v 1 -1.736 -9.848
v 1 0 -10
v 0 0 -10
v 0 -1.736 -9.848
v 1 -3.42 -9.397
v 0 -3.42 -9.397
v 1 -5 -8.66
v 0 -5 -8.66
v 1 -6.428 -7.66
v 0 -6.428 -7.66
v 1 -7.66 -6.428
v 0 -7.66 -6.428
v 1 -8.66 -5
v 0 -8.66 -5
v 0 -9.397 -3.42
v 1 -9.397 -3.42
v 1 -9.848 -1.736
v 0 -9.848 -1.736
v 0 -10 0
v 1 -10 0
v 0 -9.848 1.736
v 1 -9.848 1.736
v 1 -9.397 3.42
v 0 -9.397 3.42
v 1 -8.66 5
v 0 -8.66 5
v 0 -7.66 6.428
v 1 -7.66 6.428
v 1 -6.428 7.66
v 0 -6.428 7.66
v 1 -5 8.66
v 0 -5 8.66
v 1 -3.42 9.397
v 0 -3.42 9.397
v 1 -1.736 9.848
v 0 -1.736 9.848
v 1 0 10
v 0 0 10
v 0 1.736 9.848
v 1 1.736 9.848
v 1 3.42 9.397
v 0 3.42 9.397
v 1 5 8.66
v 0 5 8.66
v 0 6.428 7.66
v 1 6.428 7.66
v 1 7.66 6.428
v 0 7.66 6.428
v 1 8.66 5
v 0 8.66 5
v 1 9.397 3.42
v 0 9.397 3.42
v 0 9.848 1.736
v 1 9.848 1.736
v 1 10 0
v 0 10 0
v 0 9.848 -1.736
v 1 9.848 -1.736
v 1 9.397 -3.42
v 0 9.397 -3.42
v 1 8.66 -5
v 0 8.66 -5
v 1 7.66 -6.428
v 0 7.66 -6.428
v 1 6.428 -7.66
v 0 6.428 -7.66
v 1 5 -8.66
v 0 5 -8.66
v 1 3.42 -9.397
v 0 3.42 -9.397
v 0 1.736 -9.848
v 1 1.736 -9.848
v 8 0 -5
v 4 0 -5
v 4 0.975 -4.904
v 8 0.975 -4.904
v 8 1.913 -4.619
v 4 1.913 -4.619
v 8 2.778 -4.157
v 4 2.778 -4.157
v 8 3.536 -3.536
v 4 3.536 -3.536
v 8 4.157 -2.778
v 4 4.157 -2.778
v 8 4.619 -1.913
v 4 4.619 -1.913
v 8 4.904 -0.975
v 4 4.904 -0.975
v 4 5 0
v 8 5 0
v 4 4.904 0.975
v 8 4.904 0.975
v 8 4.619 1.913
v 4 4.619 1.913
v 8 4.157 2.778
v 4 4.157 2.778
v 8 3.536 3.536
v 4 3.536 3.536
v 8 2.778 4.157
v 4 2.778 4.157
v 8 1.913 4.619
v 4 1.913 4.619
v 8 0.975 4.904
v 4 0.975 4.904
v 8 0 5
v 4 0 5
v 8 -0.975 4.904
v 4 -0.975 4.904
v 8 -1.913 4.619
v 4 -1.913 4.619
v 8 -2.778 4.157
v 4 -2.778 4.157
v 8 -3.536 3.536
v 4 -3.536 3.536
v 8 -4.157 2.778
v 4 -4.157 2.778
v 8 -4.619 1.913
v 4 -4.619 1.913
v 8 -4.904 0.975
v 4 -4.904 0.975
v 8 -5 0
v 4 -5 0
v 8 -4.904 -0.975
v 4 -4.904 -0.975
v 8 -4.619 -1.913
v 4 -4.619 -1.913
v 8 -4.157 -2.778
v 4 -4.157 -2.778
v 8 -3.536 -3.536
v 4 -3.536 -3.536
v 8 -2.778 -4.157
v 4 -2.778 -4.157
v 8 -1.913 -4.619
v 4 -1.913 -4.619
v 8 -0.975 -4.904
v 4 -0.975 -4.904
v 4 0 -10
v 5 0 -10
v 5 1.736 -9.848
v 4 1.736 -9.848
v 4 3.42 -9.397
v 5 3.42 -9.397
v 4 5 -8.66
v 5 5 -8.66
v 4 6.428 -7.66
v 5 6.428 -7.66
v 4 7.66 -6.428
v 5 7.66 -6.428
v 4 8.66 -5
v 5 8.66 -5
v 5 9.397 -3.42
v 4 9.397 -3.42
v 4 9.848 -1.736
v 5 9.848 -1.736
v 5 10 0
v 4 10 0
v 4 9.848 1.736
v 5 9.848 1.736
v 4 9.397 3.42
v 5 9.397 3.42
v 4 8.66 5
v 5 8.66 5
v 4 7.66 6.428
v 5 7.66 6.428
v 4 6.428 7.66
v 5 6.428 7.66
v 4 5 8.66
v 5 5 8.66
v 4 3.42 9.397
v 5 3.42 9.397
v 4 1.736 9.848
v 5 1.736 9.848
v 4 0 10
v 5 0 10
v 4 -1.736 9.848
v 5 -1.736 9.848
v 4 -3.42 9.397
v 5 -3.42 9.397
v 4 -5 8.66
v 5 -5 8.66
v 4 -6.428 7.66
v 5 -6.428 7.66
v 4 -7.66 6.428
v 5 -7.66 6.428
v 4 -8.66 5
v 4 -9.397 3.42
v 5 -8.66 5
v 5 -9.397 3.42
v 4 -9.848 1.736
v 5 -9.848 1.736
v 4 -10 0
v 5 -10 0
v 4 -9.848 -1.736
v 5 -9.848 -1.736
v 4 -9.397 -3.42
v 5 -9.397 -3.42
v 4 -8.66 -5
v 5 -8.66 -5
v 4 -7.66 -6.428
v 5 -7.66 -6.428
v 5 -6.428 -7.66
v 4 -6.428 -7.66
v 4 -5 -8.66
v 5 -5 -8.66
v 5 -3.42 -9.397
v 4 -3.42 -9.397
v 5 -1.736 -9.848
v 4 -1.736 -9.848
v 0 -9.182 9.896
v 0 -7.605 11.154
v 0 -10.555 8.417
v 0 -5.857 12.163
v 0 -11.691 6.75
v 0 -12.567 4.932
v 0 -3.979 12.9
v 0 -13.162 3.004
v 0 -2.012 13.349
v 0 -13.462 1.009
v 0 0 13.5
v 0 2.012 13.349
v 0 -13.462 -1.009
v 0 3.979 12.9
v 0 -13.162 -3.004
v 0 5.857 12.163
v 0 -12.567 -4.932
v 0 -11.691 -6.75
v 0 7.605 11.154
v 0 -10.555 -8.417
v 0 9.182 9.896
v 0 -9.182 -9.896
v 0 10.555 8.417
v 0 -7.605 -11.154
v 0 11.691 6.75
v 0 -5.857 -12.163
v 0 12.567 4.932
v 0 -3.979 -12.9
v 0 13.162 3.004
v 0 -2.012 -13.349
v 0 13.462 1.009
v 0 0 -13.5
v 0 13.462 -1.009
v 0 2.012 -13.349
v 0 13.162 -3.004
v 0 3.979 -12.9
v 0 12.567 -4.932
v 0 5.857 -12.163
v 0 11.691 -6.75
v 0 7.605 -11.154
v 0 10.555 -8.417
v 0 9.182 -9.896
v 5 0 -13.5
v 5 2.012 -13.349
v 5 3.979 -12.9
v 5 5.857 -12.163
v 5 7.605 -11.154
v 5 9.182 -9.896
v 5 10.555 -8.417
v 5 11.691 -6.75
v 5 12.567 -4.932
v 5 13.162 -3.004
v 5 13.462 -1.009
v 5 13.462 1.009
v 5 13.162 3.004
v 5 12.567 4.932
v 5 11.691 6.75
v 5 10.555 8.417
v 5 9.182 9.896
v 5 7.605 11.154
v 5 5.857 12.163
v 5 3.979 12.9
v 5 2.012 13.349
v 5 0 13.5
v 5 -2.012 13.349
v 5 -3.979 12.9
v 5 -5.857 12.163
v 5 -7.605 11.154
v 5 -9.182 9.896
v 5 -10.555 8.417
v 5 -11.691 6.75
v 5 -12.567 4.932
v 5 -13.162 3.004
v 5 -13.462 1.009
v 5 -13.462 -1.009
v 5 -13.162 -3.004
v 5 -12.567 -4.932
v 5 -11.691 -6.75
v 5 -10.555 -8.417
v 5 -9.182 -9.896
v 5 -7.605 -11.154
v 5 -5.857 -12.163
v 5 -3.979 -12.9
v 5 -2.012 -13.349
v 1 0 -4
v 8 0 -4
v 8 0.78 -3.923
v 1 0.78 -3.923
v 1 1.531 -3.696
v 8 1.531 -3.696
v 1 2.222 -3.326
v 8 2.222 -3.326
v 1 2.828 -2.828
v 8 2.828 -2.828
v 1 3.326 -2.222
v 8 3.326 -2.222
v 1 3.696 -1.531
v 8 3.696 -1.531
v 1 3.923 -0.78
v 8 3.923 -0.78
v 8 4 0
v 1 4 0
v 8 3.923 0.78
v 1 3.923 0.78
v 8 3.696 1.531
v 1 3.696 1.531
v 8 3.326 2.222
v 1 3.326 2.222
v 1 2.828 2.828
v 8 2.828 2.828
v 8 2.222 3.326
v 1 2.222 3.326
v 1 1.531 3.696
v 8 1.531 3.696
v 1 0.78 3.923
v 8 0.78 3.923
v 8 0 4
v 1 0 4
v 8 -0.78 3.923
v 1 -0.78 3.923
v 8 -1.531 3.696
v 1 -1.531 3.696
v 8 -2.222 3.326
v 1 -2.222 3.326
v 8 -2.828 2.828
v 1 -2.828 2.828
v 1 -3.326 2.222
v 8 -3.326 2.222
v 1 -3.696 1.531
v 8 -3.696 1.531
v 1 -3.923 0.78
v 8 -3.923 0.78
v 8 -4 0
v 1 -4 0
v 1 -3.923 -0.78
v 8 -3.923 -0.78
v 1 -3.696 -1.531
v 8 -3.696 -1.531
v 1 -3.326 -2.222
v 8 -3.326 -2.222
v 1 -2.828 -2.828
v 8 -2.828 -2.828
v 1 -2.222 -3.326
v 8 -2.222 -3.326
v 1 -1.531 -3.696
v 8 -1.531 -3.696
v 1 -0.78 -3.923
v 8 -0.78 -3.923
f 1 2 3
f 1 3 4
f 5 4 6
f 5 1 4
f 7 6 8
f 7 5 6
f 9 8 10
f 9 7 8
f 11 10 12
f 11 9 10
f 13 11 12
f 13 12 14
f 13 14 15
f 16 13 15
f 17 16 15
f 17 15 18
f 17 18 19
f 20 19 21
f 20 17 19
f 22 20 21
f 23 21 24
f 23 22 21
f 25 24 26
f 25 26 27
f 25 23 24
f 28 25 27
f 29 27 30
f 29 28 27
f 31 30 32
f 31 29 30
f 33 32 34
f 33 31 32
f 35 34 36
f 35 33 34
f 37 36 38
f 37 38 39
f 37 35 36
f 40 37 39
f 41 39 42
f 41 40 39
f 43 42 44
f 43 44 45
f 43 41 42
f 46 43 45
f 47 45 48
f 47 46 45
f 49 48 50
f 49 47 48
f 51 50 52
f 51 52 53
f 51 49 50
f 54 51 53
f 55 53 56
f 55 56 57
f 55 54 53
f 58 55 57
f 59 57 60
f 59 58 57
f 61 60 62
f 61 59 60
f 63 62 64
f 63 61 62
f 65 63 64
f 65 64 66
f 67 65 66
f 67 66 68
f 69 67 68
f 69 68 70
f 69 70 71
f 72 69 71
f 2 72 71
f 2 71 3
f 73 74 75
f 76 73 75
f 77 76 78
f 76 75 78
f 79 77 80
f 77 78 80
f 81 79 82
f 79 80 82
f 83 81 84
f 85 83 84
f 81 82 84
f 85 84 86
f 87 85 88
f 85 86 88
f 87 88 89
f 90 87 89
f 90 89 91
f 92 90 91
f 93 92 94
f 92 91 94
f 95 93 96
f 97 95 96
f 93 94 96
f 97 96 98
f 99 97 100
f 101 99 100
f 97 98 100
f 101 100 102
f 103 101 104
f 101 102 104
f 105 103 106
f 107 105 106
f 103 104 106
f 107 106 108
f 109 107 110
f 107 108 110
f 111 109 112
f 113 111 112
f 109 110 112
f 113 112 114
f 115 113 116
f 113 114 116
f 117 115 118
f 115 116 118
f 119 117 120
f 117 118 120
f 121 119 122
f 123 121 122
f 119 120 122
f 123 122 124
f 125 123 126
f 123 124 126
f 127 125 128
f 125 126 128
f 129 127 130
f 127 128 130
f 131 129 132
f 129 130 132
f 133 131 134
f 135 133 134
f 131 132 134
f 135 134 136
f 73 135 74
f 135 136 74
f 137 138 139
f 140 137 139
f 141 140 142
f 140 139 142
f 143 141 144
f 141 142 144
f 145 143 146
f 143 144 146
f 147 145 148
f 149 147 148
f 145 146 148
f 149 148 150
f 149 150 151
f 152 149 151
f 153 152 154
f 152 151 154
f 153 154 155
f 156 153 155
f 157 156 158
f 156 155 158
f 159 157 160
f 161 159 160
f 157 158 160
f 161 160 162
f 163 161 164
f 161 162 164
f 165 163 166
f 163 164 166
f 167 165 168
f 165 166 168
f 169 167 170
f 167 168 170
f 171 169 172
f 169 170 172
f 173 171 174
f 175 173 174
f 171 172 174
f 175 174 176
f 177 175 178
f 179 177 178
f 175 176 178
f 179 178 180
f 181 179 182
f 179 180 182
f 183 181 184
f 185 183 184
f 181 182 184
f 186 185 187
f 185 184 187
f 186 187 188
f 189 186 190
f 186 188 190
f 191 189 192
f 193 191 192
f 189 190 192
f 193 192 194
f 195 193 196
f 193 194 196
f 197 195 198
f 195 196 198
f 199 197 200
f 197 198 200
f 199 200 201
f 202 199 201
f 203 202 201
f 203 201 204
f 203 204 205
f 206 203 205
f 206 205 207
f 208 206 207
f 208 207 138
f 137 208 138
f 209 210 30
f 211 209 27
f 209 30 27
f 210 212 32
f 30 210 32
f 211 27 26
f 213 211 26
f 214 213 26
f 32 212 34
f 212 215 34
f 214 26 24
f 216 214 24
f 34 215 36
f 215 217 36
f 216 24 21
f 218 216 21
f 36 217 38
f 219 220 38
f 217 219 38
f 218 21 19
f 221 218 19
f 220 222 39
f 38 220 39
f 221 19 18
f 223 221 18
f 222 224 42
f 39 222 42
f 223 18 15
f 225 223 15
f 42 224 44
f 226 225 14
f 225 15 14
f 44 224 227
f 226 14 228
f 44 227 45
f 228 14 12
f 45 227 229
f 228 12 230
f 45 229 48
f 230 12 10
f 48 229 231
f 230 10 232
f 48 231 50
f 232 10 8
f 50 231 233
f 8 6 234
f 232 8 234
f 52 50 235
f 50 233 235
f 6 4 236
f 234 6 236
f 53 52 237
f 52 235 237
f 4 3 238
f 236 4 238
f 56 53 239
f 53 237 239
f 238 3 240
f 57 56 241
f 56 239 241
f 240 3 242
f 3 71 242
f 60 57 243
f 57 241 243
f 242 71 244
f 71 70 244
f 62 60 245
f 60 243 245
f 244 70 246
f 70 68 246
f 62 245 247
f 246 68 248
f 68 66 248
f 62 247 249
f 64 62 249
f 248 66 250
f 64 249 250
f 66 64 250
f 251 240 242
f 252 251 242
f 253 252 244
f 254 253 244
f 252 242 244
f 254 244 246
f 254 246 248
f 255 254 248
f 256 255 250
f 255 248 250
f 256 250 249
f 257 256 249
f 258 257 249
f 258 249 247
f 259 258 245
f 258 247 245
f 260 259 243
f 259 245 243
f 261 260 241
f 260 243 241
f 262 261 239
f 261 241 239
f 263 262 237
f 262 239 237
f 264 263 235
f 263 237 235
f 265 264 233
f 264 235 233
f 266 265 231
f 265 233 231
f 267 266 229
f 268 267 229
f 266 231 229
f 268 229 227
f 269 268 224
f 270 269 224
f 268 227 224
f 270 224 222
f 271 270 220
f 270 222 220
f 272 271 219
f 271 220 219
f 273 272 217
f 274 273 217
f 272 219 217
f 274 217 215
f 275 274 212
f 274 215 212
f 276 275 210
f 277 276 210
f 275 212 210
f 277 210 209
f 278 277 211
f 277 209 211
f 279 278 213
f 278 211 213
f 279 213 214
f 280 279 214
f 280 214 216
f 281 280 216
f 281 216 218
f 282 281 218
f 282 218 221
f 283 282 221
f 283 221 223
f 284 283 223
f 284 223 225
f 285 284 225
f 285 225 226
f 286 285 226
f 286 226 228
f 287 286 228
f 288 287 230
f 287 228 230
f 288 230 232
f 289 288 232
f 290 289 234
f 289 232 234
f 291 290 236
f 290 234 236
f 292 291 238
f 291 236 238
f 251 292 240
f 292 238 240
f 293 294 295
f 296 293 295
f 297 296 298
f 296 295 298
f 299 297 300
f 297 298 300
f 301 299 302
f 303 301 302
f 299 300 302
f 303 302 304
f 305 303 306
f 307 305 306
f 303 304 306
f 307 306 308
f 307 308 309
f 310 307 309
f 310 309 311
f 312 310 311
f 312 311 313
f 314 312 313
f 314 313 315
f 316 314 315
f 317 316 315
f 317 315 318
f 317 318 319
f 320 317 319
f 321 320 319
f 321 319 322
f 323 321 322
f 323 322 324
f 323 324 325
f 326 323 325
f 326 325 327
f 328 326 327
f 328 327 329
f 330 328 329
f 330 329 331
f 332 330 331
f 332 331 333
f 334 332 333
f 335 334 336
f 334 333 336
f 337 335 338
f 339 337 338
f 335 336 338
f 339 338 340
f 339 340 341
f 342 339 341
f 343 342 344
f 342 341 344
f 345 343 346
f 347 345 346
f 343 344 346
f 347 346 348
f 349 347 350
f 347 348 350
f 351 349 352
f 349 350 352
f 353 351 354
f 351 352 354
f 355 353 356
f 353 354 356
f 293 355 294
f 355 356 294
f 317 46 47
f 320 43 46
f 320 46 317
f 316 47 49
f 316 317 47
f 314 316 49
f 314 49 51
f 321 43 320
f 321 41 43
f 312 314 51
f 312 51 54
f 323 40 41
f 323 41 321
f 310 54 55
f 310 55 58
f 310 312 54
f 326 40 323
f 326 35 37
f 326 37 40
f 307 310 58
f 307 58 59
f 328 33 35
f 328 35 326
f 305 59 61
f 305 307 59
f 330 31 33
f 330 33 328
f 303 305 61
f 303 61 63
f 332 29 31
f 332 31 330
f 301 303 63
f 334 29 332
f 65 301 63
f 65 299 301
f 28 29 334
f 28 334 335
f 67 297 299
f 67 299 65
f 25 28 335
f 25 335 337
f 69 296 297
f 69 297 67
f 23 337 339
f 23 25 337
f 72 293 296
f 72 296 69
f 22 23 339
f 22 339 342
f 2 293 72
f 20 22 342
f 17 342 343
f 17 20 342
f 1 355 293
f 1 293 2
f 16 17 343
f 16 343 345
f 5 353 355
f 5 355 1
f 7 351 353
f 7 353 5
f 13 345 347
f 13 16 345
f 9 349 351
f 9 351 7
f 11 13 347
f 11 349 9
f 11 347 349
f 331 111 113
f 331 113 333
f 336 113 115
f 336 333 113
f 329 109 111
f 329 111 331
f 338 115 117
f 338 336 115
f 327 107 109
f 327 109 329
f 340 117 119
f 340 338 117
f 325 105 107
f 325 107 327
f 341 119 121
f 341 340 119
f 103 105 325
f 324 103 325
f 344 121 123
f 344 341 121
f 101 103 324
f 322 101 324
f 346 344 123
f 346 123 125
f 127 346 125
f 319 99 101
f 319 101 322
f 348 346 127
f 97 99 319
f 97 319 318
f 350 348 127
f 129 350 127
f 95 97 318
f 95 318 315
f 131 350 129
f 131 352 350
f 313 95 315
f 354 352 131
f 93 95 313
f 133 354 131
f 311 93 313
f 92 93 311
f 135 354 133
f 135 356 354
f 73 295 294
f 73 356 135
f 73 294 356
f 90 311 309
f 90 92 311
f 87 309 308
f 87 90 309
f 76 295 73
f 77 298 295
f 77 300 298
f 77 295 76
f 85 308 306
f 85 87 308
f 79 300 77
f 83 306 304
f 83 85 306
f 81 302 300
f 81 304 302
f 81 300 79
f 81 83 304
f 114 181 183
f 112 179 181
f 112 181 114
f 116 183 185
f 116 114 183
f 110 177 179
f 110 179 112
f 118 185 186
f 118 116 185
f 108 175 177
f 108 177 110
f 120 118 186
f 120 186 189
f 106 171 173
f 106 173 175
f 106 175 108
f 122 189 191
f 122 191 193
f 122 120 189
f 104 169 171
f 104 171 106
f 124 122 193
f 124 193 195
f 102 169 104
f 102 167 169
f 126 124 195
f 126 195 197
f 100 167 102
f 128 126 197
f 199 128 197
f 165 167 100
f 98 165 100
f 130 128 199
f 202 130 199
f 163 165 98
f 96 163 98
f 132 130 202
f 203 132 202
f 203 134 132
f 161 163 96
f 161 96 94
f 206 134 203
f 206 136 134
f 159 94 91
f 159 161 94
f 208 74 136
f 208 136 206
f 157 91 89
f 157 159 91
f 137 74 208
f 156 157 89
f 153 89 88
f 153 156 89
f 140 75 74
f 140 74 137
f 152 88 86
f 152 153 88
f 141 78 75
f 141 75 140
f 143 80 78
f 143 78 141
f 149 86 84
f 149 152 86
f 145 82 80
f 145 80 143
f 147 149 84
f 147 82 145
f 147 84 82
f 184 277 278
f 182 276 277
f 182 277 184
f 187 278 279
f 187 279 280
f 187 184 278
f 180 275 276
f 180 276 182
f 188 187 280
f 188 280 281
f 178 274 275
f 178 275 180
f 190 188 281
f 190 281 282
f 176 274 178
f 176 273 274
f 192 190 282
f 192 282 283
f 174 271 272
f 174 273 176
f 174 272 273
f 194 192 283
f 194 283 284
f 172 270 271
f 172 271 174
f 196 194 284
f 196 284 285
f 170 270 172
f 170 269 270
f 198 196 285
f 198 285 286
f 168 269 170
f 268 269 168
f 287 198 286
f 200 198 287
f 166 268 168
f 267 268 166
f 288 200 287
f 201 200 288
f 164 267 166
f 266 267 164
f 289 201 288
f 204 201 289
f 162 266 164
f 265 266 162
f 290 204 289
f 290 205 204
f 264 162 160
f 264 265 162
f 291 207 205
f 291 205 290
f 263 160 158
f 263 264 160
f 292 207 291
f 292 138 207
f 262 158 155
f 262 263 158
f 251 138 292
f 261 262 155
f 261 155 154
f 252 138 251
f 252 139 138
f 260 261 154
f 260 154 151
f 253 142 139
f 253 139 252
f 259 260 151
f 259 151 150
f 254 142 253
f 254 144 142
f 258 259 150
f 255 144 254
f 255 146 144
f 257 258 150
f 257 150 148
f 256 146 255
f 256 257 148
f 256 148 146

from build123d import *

# Parameters (mm, degrees)
CROQUIS1_R              = 13.5
SALIENTE_EXTRUIR1_DEPTH = 5
CROQUIS2_R              = 10
CORTAR_EXTRUIR1_DEPTH   = 1
CORTAR_EXTRUIR2_START   = -1
CROQUIS3_R              = 10
CORTAR_EXTRUIR2_DEPTH   = 1
CROQUIS4_R              = 5
SALIENTE_EXTRUIR2_DEPTH = 4
CROQUIS5_R              = 4
CORTAR_EXTRUIR4_DEPTH   = 21.700241544


with BuildPart() as part:
    # Croquis1 → Saliente-Extruir1 (new body)
    with BuildSketch(Plane(origin=(0, 0, 0), x_dir=(0, 0, -1), z_dir=(1, 0, 0))):
        Circle(CROQUIS1_R)
    extrude(amount=SALIENTE_EXTRUIR1_DEPTH)

    # Croquis2 → Cortar-Extruir1 (cut)
    with BuildSketch(Plane(origin=(5, 0, 0), x_dir=(0, 0, -1), z_dir=(1, 0, 0))):
        Circle(CROQUIS2_R)
    extrude(amount=-CORTAR_EXTRUIR1_DEPTH, mode=Mode.SUBTRACT)

    # Croquis3 → Cortar-Extruir2 (cut)
    with BuildSketch(Plane.ZY.offset(CORTAR_EXTRUIR2_START)):
        with Locations(Location((0, 0, 0), (0, 0, 180))):
            Circle(CROQUIS3_R)
    extrude(amount=CORTAR_EXTRUIR2_DEPTH, mode=Mode.SUBTRACT)

    # Croquis4 → Saliente-Extruir2 (add)
    with BuildSketch(Plane(origin=(4, 0, 0), x_dir=(0, 0, -1), z_dir=(1, 0, 0))):
        Circle(CROQUIS4_R)
    extrude(amount=SALIENTE_EXTRUIR2_DEPTH)

    # Croquis5 → Cortar-Extruir4 (cut, through all)
    with BuildSketch(Plane(origin=(8, 0, 0), x_dir=(0, 0, -1), z_dir=(1, 0, 0))):
        Circle(CROQUIS5_R)
    extrude(amount=-CORTAR_EXTRUIR4_DEPTH, mode=Mode.SUBTRACT)


solid = part.part
